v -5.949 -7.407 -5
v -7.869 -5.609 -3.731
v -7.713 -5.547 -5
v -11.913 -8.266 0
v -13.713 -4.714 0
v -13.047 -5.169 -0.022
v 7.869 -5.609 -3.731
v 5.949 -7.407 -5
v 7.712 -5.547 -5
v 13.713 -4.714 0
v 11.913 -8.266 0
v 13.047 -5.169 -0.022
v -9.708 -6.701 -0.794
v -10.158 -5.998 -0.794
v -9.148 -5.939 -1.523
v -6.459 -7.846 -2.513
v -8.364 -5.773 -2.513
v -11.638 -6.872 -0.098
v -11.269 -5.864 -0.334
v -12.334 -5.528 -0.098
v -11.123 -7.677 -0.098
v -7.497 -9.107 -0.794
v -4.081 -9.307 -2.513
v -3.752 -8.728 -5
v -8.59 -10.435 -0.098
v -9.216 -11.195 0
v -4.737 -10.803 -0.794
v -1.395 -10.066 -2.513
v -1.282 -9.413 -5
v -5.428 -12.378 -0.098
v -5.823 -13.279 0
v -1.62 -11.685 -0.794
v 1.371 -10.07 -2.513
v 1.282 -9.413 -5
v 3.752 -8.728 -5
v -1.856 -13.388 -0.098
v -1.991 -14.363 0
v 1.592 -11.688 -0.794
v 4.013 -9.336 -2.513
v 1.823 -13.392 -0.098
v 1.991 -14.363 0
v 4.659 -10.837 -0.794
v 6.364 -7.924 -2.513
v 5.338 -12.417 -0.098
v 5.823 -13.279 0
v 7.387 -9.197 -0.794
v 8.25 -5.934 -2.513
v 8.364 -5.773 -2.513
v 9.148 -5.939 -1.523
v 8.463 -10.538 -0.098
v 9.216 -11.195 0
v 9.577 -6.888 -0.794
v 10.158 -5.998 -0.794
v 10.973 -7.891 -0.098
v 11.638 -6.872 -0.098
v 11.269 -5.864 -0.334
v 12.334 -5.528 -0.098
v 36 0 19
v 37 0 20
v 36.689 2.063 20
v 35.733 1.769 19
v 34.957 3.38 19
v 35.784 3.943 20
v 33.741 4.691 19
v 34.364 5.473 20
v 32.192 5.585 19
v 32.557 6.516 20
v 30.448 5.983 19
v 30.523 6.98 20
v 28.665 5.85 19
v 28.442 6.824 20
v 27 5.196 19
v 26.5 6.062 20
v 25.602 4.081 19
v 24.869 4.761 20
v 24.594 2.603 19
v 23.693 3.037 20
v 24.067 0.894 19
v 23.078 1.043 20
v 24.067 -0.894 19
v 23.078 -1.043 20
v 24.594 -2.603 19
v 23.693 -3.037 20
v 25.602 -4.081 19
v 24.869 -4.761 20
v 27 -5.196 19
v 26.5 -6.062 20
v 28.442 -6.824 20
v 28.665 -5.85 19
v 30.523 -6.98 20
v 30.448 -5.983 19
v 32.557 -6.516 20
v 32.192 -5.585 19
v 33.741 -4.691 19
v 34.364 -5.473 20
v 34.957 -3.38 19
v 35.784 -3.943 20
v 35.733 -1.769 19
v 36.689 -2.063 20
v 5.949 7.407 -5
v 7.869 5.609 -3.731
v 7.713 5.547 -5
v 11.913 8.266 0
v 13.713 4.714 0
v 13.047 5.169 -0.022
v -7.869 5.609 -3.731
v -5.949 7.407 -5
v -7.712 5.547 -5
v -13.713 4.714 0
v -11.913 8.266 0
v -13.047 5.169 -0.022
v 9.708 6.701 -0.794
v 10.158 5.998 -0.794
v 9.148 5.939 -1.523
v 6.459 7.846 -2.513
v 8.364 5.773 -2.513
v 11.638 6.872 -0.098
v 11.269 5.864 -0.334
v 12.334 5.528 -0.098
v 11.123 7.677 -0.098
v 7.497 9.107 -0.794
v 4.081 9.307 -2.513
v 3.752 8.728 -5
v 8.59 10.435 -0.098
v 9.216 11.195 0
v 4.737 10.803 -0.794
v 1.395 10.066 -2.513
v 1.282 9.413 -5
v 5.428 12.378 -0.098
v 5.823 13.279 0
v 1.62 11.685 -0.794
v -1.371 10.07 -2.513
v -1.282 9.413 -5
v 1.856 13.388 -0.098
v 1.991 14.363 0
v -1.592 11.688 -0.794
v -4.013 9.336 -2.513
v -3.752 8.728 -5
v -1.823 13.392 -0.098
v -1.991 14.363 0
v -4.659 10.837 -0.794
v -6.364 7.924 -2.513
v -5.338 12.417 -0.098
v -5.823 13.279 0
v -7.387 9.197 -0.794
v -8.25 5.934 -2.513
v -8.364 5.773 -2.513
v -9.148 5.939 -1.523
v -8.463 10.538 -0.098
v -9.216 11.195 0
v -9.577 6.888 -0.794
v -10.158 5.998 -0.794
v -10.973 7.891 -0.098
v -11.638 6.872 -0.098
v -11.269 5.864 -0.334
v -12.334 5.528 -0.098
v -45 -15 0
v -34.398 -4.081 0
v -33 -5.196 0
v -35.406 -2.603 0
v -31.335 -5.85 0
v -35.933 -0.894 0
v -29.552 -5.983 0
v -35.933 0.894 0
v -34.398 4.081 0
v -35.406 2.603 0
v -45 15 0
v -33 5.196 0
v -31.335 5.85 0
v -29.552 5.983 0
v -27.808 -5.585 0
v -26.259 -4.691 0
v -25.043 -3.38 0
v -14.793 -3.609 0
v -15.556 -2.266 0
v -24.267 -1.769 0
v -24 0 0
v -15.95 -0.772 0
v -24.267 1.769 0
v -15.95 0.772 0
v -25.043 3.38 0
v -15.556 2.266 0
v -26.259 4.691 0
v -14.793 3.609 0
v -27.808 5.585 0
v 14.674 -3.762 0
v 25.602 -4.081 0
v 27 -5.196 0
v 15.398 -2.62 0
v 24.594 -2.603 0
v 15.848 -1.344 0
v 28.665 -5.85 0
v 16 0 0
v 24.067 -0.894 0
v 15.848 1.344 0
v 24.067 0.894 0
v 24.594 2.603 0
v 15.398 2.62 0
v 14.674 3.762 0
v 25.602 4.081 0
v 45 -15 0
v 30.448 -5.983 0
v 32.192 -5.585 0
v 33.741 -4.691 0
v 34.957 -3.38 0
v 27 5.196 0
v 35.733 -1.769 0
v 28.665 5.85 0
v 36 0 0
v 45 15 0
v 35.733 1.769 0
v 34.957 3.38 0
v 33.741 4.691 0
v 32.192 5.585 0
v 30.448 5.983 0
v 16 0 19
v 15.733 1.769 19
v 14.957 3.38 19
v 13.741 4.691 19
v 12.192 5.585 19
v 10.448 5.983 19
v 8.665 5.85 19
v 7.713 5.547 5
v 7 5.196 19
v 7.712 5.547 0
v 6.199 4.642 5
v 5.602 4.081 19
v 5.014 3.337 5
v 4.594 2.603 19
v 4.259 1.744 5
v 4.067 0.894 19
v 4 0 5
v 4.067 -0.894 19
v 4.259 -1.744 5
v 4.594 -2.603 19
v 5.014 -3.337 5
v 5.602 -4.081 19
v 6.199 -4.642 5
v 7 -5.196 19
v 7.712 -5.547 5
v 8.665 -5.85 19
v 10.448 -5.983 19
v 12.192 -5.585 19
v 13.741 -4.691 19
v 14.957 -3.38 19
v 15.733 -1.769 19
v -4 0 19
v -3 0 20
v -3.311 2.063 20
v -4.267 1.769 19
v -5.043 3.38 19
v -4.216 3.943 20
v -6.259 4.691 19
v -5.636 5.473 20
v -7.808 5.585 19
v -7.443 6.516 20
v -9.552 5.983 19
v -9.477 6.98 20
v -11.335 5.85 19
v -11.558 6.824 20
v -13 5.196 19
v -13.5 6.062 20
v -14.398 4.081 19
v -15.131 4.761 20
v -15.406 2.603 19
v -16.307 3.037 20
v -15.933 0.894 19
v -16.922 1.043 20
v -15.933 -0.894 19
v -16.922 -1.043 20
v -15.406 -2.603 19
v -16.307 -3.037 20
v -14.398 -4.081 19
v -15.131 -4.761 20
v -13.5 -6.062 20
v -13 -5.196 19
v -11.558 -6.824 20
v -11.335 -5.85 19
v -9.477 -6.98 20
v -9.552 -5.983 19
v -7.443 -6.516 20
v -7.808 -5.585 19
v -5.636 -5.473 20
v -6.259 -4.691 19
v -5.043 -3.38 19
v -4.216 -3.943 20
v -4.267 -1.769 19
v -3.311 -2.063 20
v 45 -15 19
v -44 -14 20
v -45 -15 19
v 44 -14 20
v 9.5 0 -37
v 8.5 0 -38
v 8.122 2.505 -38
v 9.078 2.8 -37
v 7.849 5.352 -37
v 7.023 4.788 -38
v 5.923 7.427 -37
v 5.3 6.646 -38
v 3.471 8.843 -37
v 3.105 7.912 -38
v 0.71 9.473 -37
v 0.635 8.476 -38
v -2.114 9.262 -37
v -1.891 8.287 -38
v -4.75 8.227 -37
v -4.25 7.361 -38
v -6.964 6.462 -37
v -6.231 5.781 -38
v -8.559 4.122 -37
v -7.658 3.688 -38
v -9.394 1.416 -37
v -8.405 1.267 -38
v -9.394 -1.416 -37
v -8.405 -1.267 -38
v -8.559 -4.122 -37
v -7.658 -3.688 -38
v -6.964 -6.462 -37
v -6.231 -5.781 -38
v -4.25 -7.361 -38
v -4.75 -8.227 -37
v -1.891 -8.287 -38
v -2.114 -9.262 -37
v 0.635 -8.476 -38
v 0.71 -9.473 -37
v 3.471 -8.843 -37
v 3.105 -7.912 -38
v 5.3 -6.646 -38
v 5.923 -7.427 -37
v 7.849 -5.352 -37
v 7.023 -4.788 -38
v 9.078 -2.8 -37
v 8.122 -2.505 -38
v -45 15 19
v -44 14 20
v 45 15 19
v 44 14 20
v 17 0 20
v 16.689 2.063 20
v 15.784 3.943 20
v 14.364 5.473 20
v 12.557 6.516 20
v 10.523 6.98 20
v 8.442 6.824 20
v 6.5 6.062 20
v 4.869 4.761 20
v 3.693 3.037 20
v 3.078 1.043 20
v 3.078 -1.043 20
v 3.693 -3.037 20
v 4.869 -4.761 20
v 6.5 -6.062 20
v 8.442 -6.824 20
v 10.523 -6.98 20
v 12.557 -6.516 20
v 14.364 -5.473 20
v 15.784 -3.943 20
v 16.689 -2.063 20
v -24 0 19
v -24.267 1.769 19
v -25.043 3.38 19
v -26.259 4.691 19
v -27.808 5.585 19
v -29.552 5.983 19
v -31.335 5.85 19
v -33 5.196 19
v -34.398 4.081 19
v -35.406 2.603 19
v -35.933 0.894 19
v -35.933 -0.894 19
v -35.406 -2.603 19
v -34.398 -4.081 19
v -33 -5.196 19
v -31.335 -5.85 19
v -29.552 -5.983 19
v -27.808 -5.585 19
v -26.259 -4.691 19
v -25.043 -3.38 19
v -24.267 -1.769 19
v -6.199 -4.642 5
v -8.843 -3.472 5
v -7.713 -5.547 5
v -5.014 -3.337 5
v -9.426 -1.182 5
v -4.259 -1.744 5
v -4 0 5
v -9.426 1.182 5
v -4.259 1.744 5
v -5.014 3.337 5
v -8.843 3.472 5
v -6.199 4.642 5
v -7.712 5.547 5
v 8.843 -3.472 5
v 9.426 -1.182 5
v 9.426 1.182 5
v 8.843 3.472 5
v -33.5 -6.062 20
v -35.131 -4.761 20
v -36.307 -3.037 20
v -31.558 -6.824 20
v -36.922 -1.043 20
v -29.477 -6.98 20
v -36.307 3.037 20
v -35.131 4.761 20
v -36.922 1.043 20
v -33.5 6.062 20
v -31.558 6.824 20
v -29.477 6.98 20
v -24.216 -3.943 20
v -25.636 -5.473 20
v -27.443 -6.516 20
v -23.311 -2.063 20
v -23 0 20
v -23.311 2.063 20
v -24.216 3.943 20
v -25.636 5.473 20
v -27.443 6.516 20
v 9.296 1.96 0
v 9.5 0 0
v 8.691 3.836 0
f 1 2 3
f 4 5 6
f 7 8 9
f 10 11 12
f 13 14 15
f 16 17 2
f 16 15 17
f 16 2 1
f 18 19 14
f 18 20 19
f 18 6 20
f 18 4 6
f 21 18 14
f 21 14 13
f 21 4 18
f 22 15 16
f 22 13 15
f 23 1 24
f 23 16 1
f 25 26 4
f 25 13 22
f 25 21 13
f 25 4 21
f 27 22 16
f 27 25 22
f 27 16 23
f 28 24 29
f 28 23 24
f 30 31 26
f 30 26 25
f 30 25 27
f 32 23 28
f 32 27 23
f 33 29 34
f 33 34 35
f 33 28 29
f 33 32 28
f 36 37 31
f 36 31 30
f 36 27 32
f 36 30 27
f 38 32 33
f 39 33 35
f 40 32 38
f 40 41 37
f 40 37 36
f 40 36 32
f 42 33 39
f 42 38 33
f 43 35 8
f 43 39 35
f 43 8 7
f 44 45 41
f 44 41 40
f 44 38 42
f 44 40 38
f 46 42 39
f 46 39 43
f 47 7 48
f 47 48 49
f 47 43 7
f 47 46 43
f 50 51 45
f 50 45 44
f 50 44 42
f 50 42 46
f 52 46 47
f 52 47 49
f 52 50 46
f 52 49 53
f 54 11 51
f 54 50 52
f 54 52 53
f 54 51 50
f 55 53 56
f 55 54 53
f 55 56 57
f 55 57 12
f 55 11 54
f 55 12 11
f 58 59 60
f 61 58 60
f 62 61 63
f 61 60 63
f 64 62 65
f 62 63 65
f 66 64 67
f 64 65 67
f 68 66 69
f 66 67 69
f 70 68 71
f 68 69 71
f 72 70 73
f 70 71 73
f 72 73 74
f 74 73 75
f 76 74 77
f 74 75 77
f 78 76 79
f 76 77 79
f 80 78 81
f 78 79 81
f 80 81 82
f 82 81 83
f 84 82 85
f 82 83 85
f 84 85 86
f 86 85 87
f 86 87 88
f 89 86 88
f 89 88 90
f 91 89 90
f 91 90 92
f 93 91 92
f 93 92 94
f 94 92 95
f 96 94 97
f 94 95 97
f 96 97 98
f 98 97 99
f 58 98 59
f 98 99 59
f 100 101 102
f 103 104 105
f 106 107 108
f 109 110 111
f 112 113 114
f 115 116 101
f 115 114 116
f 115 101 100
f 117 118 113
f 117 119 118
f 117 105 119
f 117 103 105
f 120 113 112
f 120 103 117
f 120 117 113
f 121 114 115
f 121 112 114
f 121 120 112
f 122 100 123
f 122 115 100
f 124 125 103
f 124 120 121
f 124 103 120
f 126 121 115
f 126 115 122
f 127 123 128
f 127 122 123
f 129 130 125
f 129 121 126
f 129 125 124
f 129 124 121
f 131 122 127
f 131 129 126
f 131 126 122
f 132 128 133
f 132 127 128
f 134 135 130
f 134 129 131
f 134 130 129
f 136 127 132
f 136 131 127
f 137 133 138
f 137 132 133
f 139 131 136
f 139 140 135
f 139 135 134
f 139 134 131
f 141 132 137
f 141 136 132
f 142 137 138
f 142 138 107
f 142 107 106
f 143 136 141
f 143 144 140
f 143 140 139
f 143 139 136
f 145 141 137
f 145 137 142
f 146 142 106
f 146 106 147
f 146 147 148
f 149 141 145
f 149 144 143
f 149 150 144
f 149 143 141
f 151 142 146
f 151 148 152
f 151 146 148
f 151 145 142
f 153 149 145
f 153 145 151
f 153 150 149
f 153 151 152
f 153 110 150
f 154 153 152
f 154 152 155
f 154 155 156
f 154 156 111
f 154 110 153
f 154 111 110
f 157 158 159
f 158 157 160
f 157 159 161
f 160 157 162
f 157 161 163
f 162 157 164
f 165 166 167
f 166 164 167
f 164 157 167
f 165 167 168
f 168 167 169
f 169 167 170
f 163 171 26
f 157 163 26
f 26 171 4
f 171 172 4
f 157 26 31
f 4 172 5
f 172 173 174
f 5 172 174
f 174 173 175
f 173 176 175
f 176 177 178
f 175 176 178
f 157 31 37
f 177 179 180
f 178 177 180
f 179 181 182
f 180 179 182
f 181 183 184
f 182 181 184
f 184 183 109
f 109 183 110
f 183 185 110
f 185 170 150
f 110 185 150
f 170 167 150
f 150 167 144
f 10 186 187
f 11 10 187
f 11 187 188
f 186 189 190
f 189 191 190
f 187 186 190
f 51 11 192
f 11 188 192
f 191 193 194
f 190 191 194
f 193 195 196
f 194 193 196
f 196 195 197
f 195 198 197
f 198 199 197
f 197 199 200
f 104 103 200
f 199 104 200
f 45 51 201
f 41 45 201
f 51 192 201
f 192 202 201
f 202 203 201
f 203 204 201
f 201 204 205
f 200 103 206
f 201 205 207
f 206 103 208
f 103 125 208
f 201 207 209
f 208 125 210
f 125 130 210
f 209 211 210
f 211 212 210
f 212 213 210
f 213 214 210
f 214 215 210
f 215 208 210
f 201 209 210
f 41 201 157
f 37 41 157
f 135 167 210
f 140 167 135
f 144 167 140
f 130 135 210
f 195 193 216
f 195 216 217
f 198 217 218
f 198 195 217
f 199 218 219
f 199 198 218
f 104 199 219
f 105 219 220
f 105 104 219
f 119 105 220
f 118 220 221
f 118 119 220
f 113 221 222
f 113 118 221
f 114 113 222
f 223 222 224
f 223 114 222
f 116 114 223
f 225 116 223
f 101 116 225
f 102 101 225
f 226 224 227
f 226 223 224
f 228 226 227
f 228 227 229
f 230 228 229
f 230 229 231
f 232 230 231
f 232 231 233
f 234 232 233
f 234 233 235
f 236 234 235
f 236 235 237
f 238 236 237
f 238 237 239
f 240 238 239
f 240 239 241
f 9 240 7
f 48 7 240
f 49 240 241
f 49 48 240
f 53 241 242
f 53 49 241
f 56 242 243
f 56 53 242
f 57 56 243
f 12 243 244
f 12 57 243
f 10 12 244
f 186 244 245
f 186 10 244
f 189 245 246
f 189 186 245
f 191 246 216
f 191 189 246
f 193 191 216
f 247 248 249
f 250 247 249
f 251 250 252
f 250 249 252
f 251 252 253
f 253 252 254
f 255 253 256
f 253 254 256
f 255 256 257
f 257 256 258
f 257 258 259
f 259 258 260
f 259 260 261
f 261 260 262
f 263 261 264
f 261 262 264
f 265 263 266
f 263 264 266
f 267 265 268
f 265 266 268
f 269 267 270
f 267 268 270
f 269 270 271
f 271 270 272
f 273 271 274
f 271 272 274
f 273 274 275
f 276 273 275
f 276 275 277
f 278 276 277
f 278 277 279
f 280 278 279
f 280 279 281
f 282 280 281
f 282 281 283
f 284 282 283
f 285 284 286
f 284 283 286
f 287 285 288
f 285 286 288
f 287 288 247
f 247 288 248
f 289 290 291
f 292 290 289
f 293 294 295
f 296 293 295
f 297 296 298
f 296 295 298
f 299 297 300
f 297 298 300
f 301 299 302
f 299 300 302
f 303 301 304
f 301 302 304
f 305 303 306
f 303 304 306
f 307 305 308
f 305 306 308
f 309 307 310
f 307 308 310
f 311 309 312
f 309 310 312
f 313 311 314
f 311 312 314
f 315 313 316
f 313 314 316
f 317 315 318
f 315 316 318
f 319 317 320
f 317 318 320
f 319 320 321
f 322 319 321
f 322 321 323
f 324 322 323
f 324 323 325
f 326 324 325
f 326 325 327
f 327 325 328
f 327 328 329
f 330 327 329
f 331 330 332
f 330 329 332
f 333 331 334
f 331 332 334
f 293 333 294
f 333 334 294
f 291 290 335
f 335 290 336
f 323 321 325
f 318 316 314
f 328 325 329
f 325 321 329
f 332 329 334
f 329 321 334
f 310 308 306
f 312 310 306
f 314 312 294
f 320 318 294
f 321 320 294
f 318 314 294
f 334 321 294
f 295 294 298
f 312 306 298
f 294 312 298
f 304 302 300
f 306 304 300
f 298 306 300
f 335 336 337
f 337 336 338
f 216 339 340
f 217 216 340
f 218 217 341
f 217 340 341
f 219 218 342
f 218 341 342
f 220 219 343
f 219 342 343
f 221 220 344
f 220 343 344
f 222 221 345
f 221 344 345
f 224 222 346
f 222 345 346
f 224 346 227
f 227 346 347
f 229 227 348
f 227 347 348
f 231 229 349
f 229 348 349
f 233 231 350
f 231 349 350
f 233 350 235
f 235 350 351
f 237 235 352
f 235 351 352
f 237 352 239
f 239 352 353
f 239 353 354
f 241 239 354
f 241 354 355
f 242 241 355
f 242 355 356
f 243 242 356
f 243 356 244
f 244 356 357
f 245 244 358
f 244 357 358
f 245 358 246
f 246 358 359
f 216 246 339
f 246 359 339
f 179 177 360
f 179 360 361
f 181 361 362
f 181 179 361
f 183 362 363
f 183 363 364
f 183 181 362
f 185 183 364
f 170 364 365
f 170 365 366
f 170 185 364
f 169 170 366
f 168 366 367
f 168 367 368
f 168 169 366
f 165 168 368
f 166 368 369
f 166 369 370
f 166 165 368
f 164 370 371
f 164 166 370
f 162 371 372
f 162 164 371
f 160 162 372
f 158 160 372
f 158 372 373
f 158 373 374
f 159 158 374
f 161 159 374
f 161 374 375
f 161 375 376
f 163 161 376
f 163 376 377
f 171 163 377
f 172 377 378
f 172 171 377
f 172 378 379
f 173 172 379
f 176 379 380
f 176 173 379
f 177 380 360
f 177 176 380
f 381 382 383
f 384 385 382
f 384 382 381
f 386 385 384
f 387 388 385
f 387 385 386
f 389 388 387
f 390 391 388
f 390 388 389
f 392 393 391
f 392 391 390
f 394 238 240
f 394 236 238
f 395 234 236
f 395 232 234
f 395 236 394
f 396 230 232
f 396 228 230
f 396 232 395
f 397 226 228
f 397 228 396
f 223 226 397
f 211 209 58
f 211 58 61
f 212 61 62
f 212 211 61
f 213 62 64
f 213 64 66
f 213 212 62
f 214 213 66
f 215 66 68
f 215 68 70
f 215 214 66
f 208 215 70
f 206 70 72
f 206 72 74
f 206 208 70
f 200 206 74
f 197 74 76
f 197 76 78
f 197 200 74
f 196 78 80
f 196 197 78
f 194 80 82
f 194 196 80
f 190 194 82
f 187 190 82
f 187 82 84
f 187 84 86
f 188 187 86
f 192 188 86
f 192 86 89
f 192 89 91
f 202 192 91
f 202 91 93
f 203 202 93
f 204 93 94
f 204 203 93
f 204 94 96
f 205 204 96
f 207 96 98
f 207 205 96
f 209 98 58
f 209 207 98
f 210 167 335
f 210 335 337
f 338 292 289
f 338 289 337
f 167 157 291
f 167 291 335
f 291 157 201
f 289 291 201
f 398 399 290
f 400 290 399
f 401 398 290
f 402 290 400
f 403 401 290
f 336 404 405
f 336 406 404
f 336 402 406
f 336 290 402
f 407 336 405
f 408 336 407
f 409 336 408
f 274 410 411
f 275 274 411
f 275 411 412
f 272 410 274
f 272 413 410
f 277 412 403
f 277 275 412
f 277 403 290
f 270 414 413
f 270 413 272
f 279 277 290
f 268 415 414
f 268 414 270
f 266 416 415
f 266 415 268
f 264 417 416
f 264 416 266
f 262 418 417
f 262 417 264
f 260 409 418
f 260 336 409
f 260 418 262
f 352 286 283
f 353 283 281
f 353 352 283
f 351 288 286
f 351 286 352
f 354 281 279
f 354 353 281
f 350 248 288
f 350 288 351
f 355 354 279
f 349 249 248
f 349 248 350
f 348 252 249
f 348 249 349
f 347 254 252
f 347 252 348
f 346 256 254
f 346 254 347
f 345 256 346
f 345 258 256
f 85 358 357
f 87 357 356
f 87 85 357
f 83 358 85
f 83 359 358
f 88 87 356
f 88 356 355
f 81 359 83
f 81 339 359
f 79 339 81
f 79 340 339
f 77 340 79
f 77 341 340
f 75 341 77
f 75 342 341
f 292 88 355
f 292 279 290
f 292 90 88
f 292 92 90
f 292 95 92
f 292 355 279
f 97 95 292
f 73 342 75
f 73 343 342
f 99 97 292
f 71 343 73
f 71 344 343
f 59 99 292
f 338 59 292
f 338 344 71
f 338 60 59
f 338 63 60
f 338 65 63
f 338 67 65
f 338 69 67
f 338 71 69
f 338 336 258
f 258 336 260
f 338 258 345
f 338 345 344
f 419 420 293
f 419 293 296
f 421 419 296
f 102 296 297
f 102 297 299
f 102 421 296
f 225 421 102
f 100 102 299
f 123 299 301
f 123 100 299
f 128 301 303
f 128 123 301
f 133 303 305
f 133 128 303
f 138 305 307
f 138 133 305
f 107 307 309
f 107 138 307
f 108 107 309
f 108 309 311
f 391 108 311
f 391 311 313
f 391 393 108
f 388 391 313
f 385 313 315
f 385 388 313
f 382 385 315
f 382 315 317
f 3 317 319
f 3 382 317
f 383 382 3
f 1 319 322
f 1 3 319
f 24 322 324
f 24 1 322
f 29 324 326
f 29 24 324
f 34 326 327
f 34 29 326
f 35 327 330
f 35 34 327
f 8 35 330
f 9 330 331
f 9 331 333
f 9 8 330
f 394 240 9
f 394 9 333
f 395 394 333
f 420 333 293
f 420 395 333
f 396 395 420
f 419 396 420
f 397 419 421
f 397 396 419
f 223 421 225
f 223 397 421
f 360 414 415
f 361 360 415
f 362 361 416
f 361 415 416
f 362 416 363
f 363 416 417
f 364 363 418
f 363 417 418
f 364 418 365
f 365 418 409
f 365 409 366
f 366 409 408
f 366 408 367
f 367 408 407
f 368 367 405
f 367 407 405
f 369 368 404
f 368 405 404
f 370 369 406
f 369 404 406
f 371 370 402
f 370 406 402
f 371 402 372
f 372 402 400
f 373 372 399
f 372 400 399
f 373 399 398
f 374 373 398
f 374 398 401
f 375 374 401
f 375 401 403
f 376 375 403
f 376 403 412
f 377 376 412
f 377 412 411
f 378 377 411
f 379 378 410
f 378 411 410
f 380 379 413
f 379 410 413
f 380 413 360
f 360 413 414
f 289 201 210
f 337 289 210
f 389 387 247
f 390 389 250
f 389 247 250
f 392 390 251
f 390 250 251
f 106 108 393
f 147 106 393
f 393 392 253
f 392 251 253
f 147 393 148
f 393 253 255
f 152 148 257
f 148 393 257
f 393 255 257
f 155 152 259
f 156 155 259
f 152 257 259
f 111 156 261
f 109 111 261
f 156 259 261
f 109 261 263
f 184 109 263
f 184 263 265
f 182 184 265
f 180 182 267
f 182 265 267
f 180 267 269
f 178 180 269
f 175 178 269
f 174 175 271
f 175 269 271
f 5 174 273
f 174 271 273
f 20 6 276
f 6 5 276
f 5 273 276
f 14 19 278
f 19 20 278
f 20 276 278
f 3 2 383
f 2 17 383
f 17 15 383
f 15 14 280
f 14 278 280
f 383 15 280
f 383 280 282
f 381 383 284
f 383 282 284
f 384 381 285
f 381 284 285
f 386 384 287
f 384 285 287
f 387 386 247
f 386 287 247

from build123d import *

# Parameters (mm, degrees)
F0_W          = 90
F0_H          = 30
F0_R          = 6
F1_DEPTH      = 20
F2_SIZE       = 1
F3_R          = 9.5
F4_DEPTH      = 5
F4_DEPTH_BACK = 38
F5_SIZE       = 1
F6_T4_ANGLE   = 359.64
F6_S5_R       = 6
F6_T6_DEPTH   = 29
F6_S7_R       = 6
F6_T8_DEPTH   = 29
F6_T12_ANGLE  = 359.64
F6_S13_R      = 6
F6_T14_DEPTH  = 29
F6_S15_R      = 6
F6_T16_DEPTH  = 29


# Not quite as in the source:
# - a fillet or chamfer that OpenCascade refuses, or shapes differently, is made with other operations: its cross-section is extruded or revolved along the edge and cut away or added


with BuildPart() as f1:
    # F0 (on Top) → F1 (new body)
    with BuildSketch(Plane.XY):
        Rectangle(F0_W, F0_H)
        with Locations((-30, 0)):
            Circle(F0_R, mode=Mode.SUBTRACT)
        with Locations((-10, 0)):
            Circle(F0_R, mode=Mode.SUBTRACT)
        with Locations((10, 0)):
            Circle(F0_R, mode=Mode.SUBTRACT)
        with Locations((30, 0)):
            Circle(F0_R, mode=Mode.SUBTRACT)
    extrude(amount=F1_DEPTH)

    # F2
    f2_edges = [f1.edges().sort_by_distance(p)[0] for p in [
        (0, 15, 20),
        (-45, 0, 20),
        (0, -15, 20),
        (45, 0, 20),
        (-36, 0, 20),
        (-16, 0, 20),
        (4, 0, 20),
        (24, 0, 20),
    ]]
    chamfer(f2_edges, length=F2_SIZE)

    # F3 (on Top) → F4 (join, two sides)
    with BuildSketch(Plane.XY) as f4_sk:
        Circle(F3_R)
    extrude(amount=F4_DEPTH)
    extrude(f4_sk.sketch, amount=-F4_DEPTH_BACK)

    # F5
    f5_edges = [f1.edges().sort_by_distance(p)[0] for p in [
        (-9.5, 0, -38),
    ]]
    chamfer(f5_edges, length=F5_SIZE)

    # F6: fillet of radius 5 on 2 edges, made by hand


with BuildPart() as f6_tool2:
    # F6_s3 → F6_t4 (revolve)
    with BuildSketch(Plane(origin=(0, 0, 0), x_dir=(0, 0, 1), z_dir=(0.9999950652, 0.0031415875, 0))):
        with BuildLine():
            ThreePointArc((-5, -9.5), (-1.4644660941, -10.9644660941), (0, -14.5))
            Line((0, -14.5), (0, -9.5))
            Line((0, -9.5), (-5, -9.5))
        make_face()
    revolve(axis=Axis((0, 0, 0), (0, 0, 1)), revolution_arc=F6_T4_ANGLE)

    # F6_s5 → F6_t6 (cut, symmetric)
    with BuildSketch(Plane.XY.offset(-2.5)):
        with Locations((10, 0)):
            Circle(F6_S5_R)
    extrude(amount=F6_T6_DEPTH, both=True, mode=Mode.SUBTRACT)

    # F6_s7 → F6_t8 (cut, symmetric)
    with BuildSketch(Plane.XY.offset(-2.5)):
        with Locations((-10, 0)):
            Circle(F6_S7_R)
    extrude(amount=F6_T8_DEPTH, both=True, mode=Mode.SUBTRACT)


with BuildPart() as f1_1:
    add(f1.part)

    # F6_t1: union F6_tool2
    add(f6_tool2.part)


with BuildPart() as f6_tool10:
    # F6_s11 → F6_t12 (revolve)
    with BuildSketch(Plane(origin=(0, 0, 0), x_dir=(0, 0, 1), z_dir=(-0.9999950652, -0.0031415875, 0))):
        with BuildLine():
            ThreePointArc((-5, -9.5), (-1.4644660941, -10.9644660941), (0, -14.5))
            Line((0, -14.5), (0, -9.5))
            Line((0, -9.5), (-5, -9.5))
        make_face()
    revolve(axis=Axis((0, 0, 0), (0, 0, 1)), revolution_arc=F6_T12_ANGLE)

    # F6_s13 → F6_t14 (cut, symmetric)
    with BuildSketch(Plane.XY.offset(-2.5)):
        with Locations((10, 0)):
            Circle(F6_S13_R)
    extrude(amount=F6_T14_DEPTH, both=True, mode=Mode.SUBTRACT)

    # F6_s15 → F6_t16 (cut, symmetric)
    with BuildSketch(Plane.XY.offset(-2.5)):
        with Locations((-10, 0)):
            Circle(F6_S15_R)
    extrude(amount=F6_T16_DEPTH, both=True, mode=Mode.SUBTRACT)


with BuildPart() as f1_2:
    add(f1_1.part)

    # F6_t9: union F6_tool10
    add(f6_tool10.part)


solid = f1_2.part
